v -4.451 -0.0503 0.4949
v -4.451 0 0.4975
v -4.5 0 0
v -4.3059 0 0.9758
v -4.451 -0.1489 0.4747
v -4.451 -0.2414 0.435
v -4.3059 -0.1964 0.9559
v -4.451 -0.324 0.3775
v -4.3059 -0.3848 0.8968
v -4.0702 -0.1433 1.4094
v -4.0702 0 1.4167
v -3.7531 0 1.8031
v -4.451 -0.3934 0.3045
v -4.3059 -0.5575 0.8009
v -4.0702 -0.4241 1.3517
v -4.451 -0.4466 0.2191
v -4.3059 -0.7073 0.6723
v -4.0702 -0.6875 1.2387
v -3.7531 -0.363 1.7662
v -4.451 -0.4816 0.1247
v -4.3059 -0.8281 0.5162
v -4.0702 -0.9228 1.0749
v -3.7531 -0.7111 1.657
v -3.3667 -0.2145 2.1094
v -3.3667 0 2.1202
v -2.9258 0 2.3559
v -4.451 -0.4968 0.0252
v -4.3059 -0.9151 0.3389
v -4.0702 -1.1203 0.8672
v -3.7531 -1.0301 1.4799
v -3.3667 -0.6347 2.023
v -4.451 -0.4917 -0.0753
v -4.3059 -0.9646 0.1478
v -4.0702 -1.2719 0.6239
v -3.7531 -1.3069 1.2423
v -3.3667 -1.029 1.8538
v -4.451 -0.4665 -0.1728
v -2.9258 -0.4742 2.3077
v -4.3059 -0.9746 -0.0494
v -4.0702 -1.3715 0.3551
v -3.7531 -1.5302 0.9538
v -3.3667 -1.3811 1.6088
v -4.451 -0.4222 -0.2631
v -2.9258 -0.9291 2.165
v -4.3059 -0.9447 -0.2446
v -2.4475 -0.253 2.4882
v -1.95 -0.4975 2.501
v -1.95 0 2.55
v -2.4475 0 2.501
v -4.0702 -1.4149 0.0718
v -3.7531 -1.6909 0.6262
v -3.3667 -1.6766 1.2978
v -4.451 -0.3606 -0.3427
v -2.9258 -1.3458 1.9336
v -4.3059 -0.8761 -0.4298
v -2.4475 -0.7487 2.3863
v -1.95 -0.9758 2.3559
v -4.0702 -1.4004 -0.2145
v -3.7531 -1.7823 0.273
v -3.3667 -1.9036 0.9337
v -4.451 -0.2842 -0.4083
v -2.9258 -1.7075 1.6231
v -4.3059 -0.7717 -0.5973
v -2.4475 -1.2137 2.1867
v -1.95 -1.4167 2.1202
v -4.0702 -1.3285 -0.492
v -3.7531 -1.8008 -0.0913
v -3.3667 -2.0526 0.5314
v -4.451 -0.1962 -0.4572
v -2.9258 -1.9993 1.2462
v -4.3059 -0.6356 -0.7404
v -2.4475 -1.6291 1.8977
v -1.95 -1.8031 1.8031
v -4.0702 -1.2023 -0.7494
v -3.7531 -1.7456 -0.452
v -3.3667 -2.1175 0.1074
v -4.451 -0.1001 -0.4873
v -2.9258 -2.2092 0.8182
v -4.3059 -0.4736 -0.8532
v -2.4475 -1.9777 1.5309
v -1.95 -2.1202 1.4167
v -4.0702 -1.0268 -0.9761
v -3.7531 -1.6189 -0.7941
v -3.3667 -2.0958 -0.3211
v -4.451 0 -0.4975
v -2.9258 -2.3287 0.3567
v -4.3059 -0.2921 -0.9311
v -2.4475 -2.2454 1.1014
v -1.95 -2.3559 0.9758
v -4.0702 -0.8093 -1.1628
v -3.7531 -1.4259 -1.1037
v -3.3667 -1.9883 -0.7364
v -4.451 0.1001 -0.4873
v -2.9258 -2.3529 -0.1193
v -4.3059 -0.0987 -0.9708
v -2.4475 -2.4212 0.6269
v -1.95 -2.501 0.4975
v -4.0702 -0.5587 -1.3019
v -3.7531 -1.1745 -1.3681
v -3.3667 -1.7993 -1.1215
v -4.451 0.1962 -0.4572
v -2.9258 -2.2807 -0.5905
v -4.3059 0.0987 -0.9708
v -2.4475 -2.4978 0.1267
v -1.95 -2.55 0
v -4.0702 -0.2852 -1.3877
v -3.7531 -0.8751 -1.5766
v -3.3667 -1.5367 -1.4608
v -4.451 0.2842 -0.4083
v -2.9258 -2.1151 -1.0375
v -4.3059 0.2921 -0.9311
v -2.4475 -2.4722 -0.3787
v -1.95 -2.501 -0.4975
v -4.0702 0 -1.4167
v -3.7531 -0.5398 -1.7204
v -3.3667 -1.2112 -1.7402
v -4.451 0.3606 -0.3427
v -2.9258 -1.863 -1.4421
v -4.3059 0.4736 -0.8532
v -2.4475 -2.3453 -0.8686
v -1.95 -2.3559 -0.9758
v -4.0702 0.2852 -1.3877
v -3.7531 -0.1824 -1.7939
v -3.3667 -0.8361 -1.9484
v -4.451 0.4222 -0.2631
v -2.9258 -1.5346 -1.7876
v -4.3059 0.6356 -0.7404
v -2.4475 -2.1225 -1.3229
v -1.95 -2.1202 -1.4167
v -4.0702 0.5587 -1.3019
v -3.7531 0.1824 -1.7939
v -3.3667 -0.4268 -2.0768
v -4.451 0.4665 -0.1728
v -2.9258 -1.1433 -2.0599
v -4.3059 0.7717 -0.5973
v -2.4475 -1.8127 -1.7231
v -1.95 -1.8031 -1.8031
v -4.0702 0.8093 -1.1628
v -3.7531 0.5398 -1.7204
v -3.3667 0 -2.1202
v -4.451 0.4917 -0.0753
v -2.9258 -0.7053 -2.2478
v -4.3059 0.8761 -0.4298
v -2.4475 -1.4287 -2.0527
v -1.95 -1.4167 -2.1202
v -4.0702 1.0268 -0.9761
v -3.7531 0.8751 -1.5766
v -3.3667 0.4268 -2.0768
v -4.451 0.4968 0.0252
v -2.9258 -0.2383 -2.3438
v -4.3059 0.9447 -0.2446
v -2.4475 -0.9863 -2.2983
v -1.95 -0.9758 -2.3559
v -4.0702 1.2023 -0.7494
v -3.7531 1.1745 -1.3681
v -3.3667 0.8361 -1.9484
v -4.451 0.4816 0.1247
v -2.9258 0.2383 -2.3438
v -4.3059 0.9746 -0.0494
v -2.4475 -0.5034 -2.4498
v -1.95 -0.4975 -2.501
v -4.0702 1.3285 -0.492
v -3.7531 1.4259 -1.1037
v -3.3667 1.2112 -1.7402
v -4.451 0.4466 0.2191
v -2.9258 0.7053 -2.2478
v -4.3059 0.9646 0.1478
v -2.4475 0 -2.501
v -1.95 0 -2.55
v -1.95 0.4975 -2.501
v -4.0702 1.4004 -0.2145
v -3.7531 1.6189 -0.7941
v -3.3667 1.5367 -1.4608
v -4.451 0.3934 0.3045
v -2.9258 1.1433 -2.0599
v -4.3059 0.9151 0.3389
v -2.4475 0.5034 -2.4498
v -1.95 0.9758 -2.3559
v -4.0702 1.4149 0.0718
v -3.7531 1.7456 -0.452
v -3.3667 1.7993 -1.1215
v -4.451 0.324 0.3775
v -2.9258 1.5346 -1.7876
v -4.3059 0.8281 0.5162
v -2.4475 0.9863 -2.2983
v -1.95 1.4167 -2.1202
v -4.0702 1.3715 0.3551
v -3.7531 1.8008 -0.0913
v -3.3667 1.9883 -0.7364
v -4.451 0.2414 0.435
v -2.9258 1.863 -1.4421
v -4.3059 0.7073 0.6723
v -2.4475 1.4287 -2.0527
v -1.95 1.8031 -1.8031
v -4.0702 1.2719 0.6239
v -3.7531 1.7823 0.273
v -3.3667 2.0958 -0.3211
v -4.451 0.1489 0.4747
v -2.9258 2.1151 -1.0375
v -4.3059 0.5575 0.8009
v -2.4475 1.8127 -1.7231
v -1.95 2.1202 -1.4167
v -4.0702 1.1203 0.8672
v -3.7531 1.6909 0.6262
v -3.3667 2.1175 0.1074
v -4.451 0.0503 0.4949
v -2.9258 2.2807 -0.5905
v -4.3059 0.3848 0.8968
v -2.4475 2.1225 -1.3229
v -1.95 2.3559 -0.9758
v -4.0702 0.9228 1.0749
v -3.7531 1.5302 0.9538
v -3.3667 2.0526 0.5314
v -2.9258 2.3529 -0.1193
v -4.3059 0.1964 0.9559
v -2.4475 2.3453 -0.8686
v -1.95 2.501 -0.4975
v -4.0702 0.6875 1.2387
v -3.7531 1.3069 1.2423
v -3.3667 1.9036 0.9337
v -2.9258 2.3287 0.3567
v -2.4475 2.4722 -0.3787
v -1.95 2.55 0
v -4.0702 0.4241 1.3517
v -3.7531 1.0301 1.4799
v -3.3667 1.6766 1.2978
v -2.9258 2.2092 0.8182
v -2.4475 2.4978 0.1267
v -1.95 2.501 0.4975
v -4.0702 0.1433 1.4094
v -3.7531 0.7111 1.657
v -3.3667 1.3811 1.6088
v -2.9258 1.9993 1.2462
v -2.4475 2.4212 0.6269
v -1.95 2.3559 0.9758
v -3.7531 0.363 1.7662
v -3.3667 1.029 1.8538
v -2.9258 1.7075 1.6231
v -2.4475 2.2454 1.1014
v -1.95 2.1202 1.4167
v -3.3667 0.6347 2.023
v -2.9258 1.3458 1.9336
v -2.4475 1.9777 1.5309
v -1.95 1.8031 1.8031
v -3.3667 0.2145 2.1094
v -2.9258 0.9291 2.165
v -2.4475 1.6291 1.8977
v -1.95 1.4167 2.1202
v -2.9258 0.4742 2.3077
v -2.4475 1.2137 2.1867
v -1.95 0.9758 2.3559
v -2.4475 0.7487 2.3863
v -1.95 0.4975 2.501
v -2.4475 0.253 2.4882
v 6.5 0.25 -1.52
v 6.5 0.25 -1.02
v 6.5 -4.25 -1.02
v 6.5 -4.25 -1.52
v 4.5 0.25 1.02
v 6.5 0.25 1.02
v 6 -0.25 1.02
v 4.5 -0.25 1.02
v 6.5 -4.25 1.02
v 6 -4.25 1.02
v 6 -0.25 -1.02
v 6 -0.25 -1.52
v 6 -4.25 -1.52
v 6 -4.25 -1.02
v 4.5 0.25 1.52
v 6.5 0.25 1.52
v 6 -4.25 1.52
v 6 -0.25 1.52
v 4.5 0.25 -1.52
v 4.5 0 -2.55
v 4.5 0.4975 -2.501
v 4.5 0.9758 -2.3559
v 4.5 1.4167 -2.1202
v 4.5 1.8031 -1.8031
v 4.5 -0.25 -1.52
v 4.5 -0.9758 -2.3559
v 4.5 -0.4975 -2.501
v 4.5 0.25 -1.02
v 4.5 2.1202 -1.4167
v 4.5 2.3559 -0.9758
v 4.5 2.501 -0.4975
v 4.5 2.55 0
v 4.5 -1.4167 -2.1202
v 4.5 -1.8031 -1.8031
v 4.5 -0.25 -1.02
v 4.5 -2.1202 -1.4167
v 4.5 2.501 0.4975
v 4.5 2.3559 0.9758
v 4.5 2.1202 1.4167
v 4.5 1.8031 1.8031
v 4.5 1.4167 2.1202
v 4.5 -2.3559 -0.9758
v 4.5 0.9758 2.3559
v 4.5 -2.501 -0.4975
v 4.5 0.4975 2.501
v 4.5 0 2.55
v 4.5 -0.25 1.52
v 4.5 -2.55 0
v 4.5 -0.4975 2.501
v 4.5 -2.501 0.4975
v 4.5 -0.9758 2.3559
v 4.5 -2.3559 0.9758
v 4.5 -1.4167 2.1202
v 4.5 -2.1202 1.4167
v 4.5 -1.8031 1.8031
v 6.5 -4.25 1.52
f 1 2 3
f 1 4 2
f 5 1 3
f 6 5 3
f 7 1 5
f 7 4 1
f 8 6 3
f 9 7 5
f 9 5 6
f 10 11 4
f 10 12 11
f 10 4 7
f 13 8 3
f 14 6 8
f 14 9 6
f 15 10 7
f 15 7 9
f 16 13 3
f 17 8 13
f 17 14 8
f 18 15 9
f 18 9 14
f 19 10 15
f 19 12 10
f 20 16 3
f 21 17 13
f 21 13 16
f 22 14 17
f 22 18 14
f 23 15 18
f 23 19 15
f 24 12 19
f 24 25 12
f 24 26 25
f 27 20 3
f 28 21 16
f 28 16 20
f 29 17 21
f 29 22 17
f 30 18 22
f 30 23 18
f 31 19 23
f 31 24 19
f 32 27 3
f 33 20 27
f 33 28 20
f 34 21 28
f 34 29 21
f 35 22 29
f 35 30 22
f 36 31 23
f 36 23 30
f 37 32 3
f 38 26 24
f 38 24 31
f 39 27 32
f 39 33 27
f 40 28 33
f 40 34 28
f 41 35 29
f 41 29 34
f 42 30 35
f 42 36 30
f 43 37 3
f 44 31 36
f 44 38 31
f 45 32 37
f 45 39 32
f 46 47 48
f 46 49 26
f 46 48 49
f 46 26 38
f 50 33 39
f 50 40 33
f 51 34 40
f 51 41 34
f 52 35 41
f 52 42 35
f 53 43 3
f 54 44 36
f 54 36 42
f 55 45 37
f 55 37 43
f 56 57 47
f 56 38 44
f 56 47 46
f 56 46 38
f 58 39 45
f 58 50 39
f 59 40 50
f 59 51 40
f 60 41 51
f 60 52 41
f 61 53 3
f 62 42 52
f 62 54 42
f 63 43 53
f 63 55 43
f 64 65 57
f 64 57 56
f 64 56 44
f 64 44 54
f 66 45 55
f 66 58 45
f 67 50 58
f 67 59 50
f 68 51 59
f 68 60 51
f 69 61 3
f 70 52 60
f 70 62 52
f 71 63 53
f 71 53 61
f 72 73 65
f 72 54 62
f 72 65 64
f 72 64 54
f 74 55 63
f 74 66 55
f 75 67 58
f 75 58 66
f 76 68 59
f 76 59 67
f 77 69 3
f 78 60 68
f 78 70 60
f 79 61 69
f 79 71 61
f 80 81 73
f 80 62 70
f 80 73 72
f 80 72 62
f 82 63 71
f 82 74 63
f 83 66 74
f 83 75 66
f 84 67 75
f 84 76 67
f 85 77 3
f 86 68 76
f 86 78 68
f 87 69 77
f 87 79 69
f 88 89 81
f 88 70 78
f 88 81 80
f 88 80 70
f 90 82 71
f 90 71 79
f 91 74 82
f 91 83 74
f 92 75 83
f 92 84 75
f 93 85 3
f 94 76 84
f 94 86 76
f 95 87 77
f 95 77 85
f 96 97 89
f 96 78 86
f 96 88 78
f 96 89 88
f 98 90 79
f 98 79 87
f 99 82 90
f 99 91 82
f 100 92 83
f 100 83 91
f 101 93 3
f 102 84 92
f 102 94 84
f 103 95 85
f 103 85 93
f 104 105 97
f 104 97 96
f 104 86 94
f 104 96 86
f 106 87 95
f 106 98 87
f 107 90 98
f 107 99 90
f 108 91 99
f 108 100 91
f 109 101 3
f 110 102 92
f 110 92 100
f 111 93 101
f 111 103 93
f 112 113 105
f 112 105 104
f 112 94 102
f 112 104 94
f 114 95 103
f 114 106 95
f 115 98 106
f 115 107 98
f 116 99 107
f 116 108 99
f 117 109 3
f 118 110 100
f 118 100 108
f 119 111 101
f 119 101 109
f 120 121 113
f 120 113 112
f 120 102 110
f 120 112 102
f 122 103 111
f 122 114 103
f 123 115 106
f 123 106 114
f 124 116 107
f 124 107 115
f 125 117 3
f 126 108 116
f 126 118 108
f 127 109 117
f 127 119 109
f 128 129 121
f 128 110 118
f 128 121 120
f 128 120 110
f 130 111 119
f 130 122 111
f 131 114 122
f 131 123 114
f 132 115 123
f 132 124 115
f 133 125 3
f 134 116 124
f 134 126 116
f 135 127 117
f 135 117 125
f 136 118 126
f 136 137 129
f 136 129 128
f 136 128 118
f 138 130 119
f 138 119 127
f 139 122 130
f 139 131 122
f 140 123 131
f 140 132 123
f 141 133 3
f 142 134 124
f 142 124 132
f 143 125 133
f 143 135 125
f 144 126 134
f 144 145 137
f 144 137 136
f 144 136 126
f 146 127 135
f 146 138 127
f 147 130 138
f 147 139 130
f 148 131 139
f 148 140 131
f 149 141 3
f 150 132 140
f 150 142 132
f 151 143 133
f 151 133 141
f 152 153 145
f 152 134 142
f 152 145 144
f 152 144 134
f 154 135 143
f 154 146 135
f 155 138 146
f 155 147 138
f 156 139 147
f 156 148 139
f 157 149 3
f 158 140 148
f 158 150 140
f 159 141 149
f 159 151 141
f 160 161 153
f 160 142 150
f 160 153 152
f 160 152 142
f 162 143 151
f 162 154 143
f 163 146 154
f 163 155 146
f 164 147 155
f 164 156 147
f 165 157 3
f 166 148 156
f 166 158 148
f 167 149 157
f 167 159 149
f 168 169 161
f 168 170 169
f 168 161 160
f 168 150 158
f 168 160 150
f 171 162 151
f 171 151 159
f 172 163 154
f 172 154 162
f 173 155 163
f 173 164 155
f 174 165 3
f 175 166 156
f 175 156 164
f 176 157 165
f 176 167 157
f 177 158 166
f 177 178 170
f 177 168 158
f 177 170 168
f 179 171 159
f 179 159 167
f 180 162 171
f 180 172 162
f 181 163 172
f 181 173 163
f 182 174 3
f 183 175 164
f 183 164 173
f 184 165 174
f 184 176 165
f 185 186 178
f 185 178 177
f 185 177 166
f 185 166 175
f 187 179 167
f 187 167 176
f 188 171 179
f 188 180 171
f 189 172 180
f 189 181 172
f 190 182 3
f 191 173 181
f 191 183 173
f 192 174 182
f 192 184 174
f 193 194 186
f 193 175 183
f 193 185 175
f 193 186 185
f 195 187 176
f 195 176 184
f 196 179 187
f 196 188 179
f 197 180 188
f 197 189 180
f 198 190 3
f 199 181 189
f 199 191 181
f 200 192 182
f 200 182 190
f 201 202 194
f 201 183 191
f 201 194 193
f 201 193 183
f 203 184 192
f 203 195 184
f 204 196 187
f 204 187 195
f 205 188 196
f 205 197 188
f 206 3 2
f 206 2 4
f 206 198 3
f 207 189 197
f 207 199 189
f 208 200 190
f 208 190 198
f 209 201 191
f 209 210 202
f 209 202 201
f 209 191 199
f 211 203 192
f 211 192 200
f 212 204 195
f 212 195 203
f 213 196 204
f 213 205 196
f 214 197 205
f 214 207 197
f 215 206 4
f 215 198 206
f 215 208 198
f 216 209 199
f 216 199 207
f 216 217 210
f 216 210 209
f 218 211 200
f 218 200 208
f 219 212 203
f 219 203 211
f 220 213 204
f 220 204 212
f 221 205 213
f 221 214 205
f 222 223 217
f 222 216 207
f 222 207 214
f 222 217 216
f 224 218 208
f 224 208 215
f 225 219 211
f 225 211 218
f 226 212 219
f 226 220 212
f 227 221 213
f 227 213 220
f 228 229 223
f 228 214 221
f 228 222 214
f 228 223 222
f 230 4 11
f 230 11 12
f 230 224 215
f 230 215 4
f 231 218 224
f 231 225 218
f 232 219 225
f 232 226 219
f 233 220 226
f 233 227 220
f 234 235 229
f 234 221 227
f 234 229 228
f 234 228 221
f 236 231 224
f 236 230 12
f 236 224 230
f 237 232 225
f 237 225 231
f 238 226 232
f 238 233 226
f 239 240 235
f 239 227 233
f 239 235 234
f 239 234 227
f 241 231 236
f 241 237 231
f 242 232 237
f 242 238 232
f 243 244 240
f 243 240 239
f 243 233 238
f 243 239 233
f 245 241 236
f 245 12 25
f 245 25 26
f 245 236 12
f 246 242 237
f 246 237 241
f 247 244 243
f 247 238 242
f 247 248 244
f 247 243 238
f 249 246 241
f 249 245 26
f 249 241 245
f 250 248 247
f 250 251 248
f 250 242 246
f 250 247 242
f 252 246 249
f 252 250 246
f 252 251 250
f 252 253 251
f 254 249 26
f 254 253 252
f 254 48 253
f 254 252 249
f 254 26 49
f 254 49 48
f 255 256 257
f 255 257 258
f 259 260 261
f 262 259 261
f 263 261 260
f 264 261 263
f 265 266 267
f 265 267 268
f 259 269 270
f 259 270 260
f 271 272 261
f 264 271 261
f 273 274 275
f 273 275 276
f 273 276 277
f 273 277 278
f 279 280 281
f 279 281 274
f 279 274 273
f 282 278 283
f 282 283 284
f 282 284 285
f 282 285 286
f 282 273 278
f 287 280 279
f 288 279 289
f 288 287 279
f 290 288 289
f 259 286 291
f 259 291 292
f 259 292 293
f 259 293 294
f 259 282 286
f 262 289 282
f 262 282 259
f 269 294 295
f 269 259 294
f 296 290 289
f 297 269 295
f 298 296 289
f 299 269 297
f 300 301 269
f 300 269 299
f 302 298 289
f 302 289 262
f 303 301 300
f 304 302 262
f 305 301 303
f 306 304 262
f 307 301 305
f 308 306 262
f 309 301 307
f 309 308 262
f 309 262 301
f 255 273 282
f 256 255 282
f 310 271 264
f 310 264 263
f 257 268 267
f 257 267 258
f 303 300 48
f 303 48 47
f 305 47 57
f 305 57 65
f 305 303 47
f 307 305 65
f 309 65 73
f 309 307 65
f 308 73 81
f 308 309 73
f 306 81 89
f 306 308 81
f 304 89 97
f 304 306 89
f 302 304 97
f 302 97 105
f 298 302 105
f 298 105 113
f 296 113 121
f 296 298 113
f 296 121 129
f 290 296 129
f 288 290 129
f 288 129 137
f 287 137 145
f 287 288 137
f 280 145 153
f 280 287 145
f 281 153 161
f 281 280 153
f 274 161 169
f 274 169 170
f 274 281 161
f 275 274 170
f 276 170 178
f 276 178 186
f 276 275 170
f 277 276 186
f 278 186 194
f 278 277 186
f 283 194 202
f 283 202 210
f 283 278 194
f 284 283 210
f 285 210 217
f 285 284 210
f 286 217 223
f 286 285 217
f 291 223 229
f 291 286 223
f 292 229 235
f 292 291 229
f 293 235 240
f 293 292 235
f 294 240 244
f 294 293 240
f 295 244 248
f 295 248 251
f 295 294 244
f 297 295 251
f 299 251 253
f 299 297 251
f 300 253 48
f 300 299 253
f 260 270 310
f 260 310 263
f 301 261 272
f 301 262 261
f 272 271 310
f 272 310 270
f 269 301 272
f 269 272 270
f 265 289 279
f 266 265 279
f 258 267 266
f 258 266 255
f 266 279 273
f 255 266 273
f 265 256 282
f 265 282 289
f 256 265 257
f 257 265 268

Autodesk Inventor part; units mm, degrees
ref_plane "YZ Plane" through (0, 0, 0) normal (1, 0, 0) x (0, 1, 0)
ref_plane "XZ Plane" through (0, 0, 0) normal (0, 1, 0) x (-1, 0, 0)
ref_plane "XY Plane" through (0, 0, 0) normal (0, 0, 1) x (1, 0, 0)
sketch "スケッチ1" plane through (0, 0, 0) normal (0, 1, 0) x (-1, 0, 0)
  line L0 (4.5, 2.55) -> (-4.5, 2.55) construction
  line L1 (-4.5, 2.55) -> (-4.5, -2.55) construction
  line L2 (-4.5, -2.55) -> (4.5, -2.55) construction
  line L3 (4.5, -2.55) -> (4.5, 2.55) construction
  line L4 (4.5, 2.55) -> (-4.5, -2.55) construction
  line L5 (-4.5, 2.55) -> (4.5, -2.55) construction
  line L6 (5.4458, 0) -> (-6.2593, 0)
  line L7 (4.5, 0) -> (-4.5, 0)
  arc A0 (4.5, 0) -> (1.95, 2.55) centre (1.95, 0) ccw
  line L8 (-4.5, 2.55) -> (-4.5, 0)
  line L9 (1.95, 2.55) -> (-4.5, 2.55)
  point P0 (0, 0)
  dimension "d0" = 9
  dimension "d1" = 5.1
revolve "回転1" add sketch "スケッチ1" angle 360 about axis through (-5.4458, 0, 0) along (1, 0, 0)
sketch "スケッチ2" plane through (4.5, 0, 0) normal (1, 0, 0) x (0, 0, -1)
  line L0 (-3.2936, 0) -> (3.5532, 0)
  line L1 (0, -3.9082) -> (0, 3.9846)
  line L2 (-1.52, 0.25) -> (-1.02, 0.25)
  line L3 (-1.02, 0.25) -> (-1.02, -0.25)
  line L4 (-1.02, -0.25) -> (-1.52, -0.25)
  line L5 (-1.52, -0.25) -> (-1.52, 0.25)
  line L6 (-1.52, 0.25) -> (-1.02, -0.25) construction
  line L7 (-1.02, 0.25) -> (-1.52, -0.25) construction
  line L8 (1.52, 0.25) -> (1.02, 0.25)
  line L9 (1.02, 0.25) -> (1.02, -0.25)
  line L10 (1.02, -0.25) -> (1.52, -0.25)
  line L11 (1.52, 0.25) -> (1.02, -0.25) construction
  line L12 (1.02, 0.25) -> (1.52, -0.25) construction
  line L13 (1.52, -0.25) -> (1.52, 0.25)
  point P0 (0, 0)
  point P1 (-1.27, 0)
  point P2 (-1.27, 0)
  point P3 (1.27, 0)
  point P4 (1.27, 0)
  dimension "d9" = 0.5
  dimension "d10" = 0.5
  dimension "d11" = 1.27
extrude "押し出し1" add sketch "スケッチ2" along normal blind 2
sketch "スケッチ3" plane through (4.5, -0.25, 1.02) normal (0, -1, 0) x (1, 0, 0)
  line L0 (1.5, 0) -> (2, 0)
  line L1 (2, 0) -> (2, 0.5)
  line L2 (2, 0.5) -> (1.5, 0.5)
  line L3 (1.5, 0.5) -> (1.5, 0)
  line L4 (1.5, 0) -> (2, 0.5) construction
  line L5 (2, 0) -> (1.5, 0.5) construction
  line L6 (1.5, -2.04) -> (2, -2.04)
  line L7 (2, -2.04) -> (2, -2.54)
  line L8 (2, -2.54) -> (1.5, -2.54)
  line L9 (1.5, -2.54) -> (1.5, -2.04)
  line L10 (1.5, -2.04) -> (2, -2.54) construction
  line L11 (2, -2.04) -> (1.5, -2.54) construction
  point P0 (-4.5, -1.02)
  point P1 (1.75, 0.25)
  point P2 (1.75, -2.29)
  dimension "d14" = 0.5
  dimension "d15" = 0.5
  dimension "d16" = 0.5
  dimension "d17" = 0.5
extrude "押し出し2" add sketch "スケッチ3" along normal blind 4
properties part number "LED"
